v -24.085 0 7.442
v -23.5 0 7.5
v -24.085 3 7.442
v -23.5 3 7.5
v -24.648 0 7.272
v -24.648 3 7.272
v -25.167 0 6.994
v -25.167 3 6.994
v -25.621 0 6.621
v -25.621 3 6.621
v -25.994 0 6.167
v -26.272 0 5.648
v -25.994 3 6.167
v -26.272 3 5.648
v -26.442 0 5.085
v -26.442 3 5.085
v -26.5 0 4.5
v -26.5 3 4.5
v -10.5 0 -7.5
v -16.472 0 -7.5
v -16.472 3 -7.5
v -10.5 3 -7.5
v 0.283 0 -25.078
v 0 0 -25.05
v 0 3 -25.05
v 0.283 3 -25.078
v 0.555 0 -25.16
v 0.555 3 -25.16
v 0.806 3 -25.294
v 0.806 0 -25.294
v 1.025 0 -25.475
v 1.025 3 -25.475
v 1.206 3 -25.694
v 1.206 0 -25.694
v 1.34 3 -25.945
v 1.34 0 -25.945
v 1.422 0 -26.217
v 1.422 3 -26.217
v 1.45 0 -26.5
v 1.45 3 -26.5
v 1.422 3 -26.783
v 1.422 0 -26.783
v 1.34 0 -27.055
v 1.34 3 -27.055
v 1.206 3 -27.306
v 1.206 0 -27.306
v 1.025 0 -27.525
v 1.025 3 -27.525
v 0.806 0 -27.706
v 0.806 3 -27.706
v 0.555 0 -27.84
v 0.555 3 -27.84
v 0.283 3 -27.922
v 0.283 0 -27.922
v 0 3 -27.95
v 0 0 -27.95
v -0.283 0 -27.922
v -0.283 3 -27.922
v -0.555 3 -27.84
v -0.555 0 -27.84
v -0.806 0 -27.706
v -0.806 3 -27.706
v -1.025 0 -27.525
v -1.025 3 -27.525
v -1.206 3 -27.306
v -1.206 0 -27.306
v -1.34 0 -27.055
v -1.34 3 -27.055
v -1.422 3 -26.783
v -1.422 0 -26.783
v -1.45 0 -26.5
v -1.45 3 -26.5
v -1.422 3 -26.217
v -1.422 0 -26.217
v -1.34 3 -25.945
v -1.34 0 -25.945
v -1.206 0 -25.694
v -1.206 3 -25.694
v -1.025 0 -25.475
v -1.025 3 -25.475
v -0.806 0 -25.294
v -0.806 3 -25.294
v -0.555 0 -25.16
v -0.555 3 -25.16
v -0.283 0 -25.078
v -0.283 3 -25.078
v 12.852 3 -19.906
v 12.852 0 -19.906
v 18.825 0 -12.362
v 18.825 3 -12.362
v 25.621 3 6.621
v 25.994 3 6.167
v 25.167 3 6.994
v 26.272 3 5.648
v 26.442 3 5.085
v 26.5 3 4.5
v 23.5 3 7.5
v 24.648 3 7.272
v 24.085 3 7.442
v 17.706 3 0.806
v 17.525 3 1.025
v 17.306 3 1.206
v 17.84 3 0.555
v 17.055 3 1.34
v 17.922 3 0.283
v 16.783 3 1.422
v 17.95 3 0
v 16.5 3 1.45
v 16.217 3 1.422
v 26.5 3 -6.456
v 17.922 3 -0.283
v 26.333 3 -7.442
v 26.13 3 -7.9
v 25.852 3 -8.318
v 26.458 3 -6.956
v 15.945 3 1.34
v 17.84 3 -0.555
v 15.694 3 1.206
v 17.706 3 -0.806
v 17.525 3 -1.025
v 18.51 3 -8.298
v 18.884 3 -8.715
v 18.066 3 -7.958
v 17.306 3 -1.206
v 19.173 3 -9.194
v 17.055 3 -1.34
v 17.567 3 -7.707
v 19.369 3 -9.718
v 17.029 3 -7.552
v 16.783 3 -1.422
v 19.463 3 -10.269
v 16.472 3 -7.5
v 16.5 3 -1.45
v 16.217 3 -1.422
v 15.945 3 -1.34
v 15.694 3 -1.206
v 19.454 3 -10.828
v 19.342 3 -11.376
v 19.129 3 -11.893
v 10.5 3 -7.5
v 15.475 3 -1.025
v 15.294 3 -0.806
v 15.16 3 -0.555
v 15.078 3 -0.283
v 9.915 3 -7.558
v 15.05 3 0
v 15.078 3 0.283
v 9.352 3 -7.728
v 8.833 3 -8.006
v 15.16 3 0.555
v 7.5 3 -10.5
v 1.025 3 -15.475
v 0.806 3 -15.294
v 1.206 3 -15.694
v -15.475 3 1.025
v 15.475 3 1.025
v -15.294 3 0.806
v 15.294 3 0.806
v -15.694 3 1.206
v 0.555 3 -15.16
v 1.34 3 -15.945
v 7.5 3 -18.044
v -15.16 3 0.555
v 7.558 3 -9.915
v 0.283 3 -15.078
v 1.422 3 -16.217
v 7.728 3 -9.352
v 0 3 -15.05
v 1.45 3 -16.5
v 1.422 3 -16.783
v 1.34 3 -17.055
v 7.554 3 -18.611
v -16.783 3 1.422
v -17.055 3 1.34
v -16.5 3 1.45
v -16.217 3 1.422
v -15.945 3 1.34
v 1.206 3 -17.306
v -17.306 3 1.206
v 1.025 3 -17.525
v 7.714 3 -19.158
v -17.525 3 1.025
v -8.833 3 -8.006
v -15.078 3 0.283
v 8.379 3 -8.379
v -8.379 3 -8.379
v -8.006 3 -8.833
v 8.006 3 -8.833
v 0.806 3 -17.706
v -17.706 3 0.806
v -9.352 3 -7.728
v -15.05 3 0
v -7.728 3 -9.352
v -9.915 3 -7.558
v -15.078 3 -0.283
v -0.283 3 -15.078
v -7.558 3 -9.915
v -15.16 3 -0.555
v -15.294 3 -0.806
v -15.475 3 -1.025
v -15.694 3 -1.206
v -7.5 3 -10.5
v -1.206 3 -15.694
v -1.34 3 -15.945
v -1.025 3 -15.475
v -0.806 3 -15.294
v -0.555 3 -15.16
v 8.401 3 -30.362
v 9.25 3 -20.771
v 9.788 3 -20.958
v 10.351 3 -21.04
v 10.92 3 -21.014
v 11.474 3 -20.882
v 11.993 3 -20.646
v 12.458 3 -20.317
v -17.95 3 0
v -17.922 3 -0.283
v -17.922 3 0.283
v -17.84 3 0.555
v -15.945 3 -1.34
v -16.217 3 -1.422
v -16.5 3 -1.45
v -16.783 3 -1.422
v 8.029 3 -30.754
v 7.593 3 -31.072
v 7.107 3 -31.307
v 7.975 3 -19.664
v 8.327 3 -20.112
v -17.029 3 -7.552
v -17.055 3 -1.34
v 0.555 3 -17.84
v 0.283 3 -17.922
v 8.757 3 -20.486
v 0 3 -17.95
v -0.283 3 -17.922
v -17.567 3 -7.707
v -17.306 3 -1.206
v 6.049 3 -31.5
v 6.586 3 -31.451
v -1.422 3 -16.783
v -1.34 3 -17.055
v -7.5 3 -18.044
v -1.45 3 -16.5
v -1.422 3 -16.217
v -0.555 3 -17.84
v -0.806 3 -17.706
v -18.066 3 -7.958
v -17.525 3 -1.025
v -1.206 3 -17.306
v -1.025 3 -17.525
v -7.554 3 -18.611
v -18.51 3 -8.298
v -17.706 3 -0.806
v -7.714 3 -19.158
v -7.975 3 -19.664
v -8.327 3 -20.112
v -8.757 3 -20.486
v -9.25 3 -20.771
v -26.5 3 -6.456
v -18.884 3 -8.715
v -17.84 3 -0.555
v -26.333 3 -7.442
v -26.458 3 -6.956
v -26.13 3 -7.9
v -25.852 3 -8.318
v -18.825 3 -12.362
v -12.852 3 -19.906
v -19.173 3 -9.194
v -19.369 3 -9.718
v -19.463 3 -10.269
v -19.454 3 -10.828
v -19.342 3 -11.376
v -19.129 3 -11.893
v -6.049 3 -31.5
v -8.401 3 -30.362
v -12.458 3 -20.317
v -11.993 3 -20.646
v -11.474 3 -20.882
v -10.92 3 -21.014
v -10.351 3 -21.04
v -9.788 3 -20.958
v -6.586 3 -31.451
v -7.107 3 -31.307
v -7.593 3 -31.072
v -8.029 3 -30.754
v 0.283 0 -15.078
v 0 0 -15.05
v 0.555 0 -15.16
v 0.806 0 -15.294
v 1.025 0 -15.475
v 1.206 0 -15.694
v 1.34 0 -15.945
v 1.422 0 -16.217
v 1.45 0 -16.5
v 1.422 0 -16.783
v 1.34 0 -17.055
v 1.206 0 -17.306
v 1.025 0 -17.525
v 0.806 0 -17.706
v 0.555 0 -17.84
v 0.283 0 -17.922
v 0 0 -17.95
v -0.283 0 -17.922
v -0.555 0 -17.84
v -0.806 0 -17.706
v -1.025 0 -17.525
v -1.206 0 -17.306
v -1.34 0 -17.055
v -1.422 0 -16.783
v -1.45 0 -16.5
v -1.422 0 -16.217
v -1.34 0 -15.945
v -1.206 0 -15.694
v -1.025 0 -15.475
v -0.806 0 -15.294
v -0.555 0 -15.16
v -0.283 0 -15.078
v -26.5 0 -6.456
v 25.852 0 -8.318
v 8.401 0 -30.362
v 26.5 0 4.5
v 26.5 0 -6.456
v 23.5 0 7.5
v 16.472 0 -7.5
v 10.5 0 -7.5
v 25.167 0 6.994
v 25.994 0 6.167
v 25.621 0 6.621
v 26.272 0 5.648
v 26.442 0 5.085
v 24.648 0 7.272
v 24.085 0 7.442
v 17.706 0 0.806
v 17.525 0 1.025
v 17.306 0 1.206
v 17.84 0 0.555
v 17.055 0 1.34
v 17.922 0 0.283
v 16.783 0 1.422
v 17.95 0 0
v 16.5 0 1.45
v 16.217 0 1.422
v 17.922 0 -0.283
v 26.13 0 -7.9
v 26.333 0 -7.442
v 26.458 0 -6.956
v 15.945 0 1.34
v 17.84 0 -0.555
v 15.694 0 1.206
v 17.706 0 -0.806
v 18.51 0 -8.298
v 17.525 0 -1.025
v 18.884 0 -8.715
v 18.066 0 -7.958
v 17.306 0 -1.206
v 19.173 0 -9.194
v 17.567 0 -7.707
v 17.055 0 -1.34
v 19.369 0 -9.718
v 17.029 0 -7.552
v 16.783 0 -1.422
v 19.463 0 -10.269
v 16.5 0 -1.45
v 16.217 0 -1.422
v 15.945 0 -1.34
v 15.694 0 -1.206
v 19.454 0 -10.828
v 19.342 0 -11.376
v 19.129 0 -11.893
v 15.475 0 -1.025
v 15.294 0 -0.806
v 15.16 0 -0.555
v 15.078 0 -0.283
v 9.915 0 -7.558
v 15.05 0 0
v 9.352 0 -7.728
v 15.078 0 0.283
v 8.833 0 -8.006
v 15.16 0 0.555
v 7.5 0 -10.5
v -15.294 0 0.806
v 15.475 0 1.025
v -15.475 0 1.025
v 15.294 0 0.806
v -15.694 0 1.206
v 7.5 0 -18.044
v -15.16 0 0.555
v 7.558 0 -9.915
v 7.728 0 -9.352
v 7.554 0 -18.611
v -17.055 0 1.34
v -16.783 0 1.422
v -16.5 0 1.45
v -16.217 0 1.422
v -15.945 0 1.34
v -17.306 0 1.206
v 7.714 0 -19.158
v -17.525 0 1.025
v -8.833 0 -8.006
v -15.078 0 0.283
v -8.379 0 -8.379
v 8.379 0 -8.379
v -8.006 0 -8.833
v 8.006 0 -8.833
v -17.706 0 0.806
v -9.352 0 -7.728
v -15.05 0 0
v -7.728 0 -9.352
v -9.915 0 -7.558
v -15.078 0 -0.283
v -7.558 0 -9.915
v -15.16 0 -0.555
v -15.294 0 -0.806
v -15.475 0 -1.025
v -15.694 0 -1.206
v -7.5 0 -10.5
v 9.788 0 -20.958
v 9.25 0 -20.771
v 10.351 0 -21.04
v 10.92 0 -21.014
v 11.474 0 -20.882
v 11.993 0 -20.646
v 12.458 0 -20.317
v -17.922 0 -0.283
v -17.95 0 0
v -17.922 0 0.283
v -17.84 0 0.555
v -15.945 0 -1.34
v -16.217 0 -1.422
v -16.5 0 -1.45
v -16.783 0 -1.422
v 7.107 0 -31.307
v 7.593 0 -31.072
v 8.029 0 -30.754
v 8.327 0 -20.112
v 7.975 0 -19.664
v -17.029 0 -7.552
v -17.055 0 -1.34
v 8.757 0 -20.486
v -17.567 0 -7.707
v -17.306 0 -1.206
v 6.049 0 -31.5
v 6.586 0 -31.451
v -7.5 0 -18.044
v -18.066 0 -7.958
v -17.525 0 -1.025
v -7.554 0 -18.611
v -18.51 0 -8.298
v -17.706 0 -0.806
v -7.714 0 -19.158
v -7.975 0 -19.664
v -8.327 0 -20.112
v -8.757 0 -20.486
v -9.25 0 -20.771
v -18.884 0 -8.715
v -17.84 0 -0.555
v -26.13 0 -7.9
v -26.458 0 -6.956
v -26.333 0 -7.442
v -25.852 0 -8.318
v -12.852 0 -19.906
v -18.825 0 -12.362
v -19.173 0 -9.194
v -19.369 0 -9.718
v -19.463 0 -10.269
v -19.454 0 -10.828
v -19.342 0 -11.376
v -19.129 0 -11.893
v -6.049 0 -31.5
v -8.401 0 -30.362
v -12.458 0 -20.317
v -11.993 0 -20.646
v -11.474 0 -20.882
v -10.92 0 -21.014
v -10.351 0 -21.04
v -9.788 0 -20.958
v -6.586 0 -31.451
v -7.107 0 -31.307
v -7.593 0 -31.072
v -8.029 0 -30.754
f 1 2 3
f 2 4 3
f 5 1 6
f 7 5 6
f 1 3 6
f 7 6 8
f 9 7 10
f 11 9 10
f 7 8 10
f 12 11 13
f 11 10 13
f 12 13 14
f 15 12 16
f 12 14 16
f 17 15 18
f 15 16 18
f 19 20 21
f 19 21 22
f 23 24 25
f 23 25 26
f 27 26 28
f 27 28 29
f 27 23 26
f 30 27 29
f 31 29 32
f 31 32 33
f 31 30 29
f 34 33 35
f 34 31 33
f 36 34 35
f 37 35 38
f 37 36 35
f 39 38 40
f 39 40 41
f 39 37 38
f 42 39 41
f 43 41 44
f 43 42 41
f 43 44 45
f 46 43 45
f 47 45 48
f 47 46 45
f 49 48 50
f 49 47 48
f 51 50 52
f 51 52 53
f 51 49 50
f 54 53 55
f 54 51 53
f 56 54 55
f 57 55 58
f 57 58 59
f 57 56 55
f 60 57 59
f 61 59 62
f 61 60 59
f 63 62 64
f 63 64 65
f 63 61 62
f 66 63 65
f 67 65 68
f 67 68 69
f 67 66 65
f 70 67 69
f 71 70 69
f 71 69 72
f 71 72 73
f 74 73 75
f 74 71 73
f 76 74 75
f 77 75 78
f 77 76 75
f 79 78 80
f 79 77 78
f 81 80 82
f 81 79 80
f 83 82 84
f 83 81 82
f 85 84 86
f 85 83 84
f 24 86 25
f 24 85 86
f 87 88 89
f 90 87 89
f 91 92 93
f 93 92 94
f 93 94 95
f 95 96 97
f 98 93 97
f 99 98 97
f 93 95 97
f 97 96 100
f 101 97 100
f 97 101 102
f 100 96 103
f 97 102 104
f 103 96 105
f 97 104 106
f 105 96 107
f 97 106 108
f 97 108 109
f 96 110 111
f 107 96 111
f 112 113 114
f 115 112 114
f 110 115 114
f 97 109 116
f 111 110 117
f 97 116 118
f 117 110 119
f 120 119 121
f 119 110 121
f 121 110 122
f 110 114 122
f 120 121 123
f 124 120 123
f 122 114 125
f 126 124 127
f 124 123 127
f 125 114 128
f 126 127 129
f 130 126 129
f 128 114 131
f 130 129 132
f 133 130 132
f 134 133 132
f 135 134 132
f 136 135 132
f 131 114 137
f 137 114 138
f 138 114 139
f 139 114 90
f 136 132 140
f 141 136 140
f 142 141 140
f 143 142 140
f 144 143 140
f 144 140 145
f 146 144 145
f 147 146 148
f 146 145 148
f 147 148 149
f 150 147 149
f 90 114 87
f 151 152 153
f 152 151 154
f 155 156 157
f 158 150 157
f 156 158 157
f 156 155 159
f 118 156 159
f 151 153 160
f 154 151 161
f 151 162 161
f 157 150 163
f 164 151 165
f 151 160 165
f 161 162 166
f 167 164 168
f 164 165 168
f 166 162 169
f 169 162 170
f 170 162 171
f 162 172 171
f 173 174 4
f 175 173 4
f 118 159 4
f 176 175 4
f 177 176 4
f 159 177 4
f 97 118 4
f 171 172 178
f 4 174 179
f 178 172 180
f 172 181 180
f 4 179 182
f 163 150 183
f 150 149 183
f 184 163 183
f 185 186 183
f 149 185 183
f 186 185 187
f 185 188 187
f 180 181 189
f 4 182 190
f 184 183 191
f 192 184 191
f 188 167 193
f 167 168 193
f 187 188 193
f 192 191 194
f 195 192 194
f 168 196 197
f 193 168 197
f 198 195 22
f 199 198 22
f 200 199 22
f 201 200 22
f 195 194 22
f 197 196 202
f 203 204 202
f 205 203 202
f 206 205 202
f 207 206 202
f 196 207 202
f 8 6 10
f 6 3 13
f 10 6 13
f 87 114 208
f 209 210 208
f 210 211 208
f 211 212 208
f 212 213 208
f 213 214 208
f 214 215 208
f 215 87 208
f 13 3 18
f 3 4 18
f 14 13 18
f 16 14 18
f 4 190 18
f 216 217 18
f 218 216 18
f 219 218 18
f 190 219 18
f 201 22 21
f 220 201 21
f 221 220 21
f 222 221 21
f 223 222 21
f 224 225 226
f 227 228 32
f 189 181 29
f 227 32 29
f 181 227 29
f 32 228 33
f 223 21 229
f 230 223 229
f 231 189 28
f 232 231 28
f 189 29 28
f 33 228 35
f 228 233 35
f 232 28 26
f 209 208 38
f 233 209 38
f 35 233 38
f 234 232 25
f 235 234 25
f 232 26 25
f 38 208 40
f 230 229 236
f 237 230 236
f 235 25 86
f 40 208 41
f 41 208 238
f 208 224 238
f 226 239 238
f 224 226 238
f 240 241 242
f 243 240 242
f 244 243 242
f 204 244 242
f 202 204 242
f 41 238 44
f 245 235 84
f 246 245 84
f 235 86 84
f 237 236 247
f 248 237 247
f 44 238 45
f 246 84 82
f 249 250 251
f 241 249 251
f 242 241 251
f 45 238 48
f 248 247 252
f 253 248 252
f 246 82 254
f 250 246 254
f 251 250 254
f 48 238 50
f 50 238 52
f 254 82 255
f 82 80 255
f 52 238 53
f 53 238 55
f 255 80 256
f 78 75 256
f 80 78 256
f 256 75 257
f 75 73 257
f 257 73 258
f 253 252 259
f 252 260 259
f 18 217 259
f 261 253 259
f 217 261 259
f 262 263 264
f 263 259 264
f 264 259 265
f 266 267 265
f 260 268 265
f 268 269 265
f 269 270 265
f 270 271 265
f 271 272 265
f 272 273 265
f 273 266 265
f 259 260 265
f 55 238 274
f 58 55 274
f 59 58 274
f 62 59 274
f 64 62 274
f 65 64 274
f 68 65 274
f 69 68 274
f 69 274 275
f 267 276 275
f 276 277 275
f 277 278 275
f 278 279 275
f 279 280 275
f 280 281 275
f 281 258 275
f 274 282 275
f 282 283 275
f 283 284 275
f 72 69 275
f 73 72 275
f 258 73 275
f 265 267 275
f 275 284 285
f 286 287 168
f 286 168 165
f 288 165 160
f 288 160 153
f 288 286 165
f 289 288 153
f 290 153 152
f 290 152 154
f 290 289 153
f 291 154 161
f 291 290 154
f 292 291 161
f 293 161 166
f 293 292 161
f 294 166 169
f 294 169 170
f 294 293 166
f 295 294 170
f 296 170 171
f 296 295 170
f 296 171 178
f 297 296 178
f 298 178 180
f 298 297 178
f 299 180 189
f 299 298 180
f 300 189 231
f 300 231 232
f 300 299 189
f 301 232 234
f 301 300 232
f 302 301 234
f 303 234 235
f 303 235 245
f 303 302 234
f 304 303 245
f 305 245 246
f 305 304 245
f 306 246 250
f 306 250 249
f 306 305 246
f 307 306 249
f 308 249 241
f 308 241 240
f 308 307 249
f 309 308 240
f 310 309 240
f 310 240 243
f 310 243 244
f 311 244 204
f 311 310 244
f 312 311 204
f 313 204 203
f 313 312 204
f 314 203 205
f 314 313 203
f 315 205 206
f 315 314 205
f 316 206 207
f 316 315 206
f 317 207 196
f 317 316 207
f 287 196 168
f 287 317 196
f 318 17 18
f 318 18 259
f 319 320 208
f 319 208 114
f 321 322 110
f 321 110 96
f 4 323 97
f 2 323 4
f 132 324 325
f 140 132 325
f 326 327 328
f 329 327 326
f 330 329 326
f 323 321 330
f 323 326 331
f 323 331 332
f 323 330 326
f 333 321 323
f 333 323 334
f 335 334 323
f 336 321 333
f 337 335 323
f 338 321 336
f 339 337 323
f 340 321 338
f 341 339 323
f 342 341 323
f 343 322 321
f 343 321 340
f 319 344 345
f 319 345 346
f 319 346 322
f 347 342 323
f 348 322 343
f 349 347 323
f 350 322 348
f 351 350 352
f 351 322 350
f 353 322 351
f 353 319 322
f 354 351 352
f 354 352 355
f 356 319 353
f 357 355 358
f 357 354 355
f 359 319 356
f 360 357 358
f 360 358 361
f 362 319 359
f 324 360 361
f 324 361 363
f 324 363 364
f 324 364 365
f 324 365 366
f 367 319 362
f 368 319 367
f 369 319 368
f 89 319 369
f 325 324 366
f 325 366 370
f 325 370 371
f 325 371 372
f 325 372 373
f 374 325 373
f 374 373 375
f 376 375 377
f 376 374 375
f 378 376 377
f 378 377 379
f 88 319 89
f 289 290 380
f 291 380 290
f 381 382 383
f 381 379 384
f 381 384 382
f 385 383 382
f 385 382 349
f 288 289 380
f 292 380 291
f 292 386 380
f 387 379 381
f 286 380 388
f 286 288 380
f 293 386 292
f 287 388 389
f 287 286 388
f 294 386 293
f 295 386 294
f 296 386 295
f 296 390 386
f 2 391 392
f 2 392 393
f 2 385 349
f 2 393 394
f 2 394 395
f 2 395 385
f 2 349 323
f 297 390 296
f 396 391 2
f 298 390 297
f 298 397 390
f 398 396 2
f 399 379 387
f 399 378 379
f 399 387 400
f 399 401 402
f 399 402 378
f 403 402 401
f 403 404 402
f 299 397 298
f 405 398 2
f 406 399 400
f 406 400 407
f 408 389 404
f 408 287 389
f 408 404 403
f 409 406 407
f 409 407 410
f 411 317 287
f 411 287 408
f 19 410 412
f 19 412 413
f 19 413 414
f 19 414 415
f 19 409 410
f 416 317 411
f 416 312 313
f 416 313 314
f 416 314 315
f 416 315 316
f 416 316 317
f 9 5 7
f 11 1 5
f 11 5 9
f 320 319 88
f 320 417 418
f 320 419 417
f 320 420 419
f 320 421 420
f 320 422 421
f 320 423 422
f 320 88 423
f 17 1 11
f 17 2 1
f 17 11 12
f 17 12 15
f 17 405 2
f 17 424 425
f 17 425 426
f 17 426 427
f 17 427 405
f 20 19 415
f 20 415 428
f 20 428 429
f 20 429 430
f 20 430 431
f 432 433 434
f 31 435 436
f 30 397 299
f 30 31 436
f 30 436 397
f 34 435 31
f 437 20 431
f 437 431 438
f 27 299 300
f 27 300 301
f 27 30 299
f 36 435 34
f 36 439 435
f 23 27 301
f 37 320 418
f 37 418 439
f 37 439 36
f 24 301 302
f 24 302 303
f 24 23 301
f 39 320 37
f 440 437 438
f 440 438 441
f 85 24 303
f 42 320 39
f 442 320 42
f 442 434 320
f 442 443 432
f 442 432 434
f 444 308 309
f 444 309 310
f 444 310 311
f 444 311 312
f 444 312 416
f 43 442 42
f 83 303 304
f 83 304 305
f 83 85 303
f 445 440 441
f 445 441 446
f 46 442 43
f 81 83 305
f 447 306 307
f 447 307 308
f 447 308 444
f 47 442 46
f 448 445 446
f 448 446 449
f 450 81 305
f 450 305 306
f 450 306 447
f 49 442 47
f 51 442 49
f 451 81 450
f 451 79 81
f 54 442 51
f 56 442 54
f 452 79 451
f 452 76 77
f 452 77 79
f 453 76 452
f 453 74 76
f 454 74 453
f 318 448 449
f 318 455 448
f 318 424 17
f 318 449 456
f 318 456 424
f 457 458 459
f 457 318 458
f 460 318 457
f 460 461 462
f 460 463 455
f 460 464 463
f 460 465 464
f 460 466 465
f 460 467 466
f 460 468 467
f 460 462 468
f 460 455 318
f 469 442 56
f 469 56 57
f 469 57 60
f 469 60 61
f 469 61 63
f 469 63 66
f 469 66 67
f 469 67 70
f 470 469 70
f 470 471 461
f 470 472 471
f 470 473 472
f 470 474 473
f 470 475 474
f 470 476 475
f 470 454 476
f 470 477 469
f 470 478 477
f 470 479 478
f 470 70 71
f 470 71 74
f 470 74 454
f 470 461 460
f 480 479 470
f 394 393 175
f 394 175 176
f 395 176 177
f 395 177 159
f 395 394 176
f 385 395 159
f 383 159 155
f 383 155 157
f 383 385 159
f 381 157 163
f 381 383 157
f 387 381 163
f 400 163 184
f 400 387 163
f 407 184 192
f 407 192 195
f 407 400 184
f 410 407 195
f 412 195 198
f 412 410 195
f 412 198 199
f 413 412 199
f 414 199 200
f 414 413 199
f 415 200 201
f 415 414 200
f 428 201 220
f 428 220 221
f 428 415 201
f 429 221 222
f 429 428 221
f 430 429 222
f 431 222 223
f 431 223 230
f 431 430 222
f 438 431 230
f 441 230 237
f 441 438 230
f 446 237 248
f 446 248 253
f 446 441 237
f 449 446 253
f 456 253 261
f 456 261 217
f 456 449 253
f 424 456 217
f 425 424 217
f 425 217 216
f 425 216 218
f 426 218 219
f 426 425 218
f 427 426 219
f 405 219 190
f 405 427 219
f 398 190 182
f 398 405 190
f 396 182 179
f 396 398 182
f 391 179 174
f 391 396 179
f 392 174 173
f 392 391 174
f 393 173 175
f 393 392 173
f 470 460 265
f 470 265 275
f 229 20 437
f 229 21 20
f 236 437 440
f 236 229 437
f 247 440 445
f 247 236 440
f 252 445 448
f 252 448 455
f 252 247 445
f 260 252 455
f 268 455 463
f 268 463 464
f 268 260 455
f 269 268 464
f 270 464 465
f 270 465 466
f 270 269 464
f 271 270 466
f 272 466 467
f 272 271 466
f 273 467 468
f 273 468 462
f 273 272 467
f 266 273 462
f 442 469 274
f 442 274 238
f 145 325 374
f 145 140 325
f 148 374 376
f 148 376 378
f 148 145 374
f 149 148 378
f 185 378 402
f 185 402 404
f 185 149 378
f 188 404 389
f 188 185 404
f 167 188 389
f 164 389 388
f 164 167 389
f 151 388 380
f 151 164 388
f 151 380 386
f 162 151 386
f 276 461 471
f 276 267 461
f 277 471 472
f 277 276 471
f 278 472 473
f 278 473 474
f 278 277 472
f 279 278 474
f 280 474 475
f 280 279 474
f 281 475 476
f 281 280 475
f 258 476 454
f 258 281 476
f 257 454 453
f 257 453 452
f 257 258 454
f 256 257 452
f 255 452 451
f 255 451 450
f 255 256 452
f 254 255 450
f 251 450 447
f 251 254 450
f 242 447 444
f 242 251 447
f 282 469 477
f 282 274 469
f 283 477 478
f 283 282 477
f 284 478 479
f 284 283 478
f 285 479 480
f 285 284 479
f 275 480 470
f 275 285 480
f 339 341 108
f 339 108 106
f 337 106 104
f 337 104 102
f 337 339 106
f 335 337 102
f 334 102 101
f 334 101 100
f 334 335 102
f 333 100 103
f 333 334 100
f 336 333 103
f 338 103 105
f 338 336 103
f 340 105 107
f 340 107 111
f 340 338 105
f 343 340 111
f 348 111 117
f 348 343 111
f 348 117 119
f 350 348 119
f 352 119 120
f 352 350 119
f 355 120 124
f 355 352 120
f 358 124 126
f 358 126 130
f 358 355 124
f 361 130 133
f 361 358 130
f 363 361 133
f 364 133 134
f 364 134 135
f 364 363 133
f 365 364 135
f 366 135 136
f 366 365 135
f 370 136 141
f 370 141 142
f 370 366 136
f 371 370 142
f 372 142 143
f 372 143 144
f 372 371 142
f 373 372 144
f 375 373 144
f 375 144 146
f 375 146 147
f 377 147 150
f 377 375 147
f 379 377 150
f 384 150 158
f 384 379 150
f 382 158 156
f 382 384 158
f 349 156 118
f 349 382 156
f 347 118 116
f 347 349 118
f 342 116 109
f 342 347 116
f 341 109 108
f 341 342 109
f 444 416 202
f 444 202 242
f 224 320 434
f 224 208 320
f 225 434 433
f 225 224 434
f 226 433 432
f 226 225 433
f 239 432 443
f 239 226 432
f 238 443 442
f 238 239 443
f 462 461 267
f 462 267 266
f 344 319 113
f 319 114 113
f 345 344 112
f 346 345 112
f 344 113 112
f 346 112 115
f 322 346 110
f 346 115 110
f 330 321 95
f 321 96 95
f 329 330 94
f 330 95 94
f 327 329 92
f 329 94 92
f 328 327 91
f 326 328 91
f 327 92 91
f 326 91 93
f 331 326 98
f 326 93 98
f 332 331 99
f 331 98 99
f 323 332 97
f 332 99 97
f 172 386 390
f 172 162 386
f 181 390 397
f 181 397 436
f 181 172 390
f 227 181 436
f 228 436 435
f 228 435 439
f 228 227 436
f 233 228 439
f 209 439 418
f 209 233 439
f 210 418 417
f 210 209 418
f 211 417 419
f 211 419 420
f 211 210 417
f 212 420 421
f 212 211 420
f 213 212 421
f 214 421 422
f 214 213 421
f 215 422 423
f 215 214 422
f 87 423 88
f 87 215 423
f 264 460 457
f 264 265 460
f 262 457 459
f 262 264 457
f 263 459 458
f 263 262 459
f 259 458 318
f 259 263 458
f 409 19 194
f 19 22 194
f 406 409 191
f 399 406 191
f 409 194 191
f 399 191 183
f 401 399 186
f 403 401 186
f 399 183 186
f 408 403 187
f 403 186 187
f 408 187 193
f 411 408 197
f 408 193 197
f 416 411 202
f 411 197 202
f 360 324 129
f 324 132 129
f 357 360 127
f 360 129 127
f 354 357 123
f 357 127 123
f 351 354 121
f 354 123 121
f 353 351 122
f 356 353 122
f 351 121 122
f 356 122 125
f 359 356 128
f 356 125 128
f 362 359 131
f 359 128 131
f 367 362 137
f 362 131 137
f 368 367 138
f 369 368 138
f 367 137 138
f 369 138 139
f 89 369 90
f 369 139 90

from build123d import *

# Parameters (mm, degrees)
SKETCH_1_R      = 1.45
EXTRUDE_1_DEPTH = 3
FILLET_2_R      = 3


with BuildPart() as part:
    # 草图1 → 凸台-拉伸1 (new body)
    with BuildSketch(Plane(origin=(0, 0, 0), x_dir=(1, 0, 0), z_dir=(0, 1, 0))):
        Polygon((7.5, 31.5), (26.5, 7.5), (26.5, -7.5), (-26.5, -7.5), (-26.5, 7.5), (-7.5, 31.5), align=None)
        with Locations(Location((0, 26.5, 0), (0, 0, 270))):
            Circle(SKETCH_1_R, mode=Mode.SUBTRACT)
        with Locations(Location((0, 16.5, 0), (0, 0, 270))):
            Circle(SKETCH_1_R, mode=Mode.SUBTRACT)
        with Locations(Location((16.5, 0, 0), (0, 0, 270))):
            Circle(SKETCH_1_R, mode=Mode.SUBTRACT)
        with Locations(Location((-16.5, 0, 0), (0, 0, 270))):
            Circle(SKETCH_1_R, mode=Mode.SUBTRACT)
        Polygon((-7.5, 7.5), (-7.5, 26.666770148), (-22.673693034, 7.5), align=None, mode=Mode.SUBTRACT)
        Polygon((22.673693034, 7.5), (7.5, 7.5), (7.5, 26.666770148), align=None, mode=Mode.SUBTRACT)
    extrude(amount=EXTRUDE_1_DEPTH)

    # 圆角2
    fillet_2_edges = [part.edges().sort_by_distance(p)[0] for p in [
        (22.673693034, 1.5, -7.5),
        (7.5, 1.5, -26.666770148),
        (7.5, 1.5, -7.5),
        (26.5, 1.5, -7.5),
        (26.5, 1.5, 7.5),
        (-26.5, 1.5, 7.5),
        (-26.5, 1.5, -7.5),
        (-7.5, 1.5, -31.5),
        (7.5, 1.5, -31.5),
        (-7.5, 1.5, -26.666770148),
        (-22.673693034, 1.5, -7.5),
        (-7.5, 1.5, -7.5),
    ]]
    fillet(fillet_2_edges, radius=FILLET_2_R)


solid = part.part
